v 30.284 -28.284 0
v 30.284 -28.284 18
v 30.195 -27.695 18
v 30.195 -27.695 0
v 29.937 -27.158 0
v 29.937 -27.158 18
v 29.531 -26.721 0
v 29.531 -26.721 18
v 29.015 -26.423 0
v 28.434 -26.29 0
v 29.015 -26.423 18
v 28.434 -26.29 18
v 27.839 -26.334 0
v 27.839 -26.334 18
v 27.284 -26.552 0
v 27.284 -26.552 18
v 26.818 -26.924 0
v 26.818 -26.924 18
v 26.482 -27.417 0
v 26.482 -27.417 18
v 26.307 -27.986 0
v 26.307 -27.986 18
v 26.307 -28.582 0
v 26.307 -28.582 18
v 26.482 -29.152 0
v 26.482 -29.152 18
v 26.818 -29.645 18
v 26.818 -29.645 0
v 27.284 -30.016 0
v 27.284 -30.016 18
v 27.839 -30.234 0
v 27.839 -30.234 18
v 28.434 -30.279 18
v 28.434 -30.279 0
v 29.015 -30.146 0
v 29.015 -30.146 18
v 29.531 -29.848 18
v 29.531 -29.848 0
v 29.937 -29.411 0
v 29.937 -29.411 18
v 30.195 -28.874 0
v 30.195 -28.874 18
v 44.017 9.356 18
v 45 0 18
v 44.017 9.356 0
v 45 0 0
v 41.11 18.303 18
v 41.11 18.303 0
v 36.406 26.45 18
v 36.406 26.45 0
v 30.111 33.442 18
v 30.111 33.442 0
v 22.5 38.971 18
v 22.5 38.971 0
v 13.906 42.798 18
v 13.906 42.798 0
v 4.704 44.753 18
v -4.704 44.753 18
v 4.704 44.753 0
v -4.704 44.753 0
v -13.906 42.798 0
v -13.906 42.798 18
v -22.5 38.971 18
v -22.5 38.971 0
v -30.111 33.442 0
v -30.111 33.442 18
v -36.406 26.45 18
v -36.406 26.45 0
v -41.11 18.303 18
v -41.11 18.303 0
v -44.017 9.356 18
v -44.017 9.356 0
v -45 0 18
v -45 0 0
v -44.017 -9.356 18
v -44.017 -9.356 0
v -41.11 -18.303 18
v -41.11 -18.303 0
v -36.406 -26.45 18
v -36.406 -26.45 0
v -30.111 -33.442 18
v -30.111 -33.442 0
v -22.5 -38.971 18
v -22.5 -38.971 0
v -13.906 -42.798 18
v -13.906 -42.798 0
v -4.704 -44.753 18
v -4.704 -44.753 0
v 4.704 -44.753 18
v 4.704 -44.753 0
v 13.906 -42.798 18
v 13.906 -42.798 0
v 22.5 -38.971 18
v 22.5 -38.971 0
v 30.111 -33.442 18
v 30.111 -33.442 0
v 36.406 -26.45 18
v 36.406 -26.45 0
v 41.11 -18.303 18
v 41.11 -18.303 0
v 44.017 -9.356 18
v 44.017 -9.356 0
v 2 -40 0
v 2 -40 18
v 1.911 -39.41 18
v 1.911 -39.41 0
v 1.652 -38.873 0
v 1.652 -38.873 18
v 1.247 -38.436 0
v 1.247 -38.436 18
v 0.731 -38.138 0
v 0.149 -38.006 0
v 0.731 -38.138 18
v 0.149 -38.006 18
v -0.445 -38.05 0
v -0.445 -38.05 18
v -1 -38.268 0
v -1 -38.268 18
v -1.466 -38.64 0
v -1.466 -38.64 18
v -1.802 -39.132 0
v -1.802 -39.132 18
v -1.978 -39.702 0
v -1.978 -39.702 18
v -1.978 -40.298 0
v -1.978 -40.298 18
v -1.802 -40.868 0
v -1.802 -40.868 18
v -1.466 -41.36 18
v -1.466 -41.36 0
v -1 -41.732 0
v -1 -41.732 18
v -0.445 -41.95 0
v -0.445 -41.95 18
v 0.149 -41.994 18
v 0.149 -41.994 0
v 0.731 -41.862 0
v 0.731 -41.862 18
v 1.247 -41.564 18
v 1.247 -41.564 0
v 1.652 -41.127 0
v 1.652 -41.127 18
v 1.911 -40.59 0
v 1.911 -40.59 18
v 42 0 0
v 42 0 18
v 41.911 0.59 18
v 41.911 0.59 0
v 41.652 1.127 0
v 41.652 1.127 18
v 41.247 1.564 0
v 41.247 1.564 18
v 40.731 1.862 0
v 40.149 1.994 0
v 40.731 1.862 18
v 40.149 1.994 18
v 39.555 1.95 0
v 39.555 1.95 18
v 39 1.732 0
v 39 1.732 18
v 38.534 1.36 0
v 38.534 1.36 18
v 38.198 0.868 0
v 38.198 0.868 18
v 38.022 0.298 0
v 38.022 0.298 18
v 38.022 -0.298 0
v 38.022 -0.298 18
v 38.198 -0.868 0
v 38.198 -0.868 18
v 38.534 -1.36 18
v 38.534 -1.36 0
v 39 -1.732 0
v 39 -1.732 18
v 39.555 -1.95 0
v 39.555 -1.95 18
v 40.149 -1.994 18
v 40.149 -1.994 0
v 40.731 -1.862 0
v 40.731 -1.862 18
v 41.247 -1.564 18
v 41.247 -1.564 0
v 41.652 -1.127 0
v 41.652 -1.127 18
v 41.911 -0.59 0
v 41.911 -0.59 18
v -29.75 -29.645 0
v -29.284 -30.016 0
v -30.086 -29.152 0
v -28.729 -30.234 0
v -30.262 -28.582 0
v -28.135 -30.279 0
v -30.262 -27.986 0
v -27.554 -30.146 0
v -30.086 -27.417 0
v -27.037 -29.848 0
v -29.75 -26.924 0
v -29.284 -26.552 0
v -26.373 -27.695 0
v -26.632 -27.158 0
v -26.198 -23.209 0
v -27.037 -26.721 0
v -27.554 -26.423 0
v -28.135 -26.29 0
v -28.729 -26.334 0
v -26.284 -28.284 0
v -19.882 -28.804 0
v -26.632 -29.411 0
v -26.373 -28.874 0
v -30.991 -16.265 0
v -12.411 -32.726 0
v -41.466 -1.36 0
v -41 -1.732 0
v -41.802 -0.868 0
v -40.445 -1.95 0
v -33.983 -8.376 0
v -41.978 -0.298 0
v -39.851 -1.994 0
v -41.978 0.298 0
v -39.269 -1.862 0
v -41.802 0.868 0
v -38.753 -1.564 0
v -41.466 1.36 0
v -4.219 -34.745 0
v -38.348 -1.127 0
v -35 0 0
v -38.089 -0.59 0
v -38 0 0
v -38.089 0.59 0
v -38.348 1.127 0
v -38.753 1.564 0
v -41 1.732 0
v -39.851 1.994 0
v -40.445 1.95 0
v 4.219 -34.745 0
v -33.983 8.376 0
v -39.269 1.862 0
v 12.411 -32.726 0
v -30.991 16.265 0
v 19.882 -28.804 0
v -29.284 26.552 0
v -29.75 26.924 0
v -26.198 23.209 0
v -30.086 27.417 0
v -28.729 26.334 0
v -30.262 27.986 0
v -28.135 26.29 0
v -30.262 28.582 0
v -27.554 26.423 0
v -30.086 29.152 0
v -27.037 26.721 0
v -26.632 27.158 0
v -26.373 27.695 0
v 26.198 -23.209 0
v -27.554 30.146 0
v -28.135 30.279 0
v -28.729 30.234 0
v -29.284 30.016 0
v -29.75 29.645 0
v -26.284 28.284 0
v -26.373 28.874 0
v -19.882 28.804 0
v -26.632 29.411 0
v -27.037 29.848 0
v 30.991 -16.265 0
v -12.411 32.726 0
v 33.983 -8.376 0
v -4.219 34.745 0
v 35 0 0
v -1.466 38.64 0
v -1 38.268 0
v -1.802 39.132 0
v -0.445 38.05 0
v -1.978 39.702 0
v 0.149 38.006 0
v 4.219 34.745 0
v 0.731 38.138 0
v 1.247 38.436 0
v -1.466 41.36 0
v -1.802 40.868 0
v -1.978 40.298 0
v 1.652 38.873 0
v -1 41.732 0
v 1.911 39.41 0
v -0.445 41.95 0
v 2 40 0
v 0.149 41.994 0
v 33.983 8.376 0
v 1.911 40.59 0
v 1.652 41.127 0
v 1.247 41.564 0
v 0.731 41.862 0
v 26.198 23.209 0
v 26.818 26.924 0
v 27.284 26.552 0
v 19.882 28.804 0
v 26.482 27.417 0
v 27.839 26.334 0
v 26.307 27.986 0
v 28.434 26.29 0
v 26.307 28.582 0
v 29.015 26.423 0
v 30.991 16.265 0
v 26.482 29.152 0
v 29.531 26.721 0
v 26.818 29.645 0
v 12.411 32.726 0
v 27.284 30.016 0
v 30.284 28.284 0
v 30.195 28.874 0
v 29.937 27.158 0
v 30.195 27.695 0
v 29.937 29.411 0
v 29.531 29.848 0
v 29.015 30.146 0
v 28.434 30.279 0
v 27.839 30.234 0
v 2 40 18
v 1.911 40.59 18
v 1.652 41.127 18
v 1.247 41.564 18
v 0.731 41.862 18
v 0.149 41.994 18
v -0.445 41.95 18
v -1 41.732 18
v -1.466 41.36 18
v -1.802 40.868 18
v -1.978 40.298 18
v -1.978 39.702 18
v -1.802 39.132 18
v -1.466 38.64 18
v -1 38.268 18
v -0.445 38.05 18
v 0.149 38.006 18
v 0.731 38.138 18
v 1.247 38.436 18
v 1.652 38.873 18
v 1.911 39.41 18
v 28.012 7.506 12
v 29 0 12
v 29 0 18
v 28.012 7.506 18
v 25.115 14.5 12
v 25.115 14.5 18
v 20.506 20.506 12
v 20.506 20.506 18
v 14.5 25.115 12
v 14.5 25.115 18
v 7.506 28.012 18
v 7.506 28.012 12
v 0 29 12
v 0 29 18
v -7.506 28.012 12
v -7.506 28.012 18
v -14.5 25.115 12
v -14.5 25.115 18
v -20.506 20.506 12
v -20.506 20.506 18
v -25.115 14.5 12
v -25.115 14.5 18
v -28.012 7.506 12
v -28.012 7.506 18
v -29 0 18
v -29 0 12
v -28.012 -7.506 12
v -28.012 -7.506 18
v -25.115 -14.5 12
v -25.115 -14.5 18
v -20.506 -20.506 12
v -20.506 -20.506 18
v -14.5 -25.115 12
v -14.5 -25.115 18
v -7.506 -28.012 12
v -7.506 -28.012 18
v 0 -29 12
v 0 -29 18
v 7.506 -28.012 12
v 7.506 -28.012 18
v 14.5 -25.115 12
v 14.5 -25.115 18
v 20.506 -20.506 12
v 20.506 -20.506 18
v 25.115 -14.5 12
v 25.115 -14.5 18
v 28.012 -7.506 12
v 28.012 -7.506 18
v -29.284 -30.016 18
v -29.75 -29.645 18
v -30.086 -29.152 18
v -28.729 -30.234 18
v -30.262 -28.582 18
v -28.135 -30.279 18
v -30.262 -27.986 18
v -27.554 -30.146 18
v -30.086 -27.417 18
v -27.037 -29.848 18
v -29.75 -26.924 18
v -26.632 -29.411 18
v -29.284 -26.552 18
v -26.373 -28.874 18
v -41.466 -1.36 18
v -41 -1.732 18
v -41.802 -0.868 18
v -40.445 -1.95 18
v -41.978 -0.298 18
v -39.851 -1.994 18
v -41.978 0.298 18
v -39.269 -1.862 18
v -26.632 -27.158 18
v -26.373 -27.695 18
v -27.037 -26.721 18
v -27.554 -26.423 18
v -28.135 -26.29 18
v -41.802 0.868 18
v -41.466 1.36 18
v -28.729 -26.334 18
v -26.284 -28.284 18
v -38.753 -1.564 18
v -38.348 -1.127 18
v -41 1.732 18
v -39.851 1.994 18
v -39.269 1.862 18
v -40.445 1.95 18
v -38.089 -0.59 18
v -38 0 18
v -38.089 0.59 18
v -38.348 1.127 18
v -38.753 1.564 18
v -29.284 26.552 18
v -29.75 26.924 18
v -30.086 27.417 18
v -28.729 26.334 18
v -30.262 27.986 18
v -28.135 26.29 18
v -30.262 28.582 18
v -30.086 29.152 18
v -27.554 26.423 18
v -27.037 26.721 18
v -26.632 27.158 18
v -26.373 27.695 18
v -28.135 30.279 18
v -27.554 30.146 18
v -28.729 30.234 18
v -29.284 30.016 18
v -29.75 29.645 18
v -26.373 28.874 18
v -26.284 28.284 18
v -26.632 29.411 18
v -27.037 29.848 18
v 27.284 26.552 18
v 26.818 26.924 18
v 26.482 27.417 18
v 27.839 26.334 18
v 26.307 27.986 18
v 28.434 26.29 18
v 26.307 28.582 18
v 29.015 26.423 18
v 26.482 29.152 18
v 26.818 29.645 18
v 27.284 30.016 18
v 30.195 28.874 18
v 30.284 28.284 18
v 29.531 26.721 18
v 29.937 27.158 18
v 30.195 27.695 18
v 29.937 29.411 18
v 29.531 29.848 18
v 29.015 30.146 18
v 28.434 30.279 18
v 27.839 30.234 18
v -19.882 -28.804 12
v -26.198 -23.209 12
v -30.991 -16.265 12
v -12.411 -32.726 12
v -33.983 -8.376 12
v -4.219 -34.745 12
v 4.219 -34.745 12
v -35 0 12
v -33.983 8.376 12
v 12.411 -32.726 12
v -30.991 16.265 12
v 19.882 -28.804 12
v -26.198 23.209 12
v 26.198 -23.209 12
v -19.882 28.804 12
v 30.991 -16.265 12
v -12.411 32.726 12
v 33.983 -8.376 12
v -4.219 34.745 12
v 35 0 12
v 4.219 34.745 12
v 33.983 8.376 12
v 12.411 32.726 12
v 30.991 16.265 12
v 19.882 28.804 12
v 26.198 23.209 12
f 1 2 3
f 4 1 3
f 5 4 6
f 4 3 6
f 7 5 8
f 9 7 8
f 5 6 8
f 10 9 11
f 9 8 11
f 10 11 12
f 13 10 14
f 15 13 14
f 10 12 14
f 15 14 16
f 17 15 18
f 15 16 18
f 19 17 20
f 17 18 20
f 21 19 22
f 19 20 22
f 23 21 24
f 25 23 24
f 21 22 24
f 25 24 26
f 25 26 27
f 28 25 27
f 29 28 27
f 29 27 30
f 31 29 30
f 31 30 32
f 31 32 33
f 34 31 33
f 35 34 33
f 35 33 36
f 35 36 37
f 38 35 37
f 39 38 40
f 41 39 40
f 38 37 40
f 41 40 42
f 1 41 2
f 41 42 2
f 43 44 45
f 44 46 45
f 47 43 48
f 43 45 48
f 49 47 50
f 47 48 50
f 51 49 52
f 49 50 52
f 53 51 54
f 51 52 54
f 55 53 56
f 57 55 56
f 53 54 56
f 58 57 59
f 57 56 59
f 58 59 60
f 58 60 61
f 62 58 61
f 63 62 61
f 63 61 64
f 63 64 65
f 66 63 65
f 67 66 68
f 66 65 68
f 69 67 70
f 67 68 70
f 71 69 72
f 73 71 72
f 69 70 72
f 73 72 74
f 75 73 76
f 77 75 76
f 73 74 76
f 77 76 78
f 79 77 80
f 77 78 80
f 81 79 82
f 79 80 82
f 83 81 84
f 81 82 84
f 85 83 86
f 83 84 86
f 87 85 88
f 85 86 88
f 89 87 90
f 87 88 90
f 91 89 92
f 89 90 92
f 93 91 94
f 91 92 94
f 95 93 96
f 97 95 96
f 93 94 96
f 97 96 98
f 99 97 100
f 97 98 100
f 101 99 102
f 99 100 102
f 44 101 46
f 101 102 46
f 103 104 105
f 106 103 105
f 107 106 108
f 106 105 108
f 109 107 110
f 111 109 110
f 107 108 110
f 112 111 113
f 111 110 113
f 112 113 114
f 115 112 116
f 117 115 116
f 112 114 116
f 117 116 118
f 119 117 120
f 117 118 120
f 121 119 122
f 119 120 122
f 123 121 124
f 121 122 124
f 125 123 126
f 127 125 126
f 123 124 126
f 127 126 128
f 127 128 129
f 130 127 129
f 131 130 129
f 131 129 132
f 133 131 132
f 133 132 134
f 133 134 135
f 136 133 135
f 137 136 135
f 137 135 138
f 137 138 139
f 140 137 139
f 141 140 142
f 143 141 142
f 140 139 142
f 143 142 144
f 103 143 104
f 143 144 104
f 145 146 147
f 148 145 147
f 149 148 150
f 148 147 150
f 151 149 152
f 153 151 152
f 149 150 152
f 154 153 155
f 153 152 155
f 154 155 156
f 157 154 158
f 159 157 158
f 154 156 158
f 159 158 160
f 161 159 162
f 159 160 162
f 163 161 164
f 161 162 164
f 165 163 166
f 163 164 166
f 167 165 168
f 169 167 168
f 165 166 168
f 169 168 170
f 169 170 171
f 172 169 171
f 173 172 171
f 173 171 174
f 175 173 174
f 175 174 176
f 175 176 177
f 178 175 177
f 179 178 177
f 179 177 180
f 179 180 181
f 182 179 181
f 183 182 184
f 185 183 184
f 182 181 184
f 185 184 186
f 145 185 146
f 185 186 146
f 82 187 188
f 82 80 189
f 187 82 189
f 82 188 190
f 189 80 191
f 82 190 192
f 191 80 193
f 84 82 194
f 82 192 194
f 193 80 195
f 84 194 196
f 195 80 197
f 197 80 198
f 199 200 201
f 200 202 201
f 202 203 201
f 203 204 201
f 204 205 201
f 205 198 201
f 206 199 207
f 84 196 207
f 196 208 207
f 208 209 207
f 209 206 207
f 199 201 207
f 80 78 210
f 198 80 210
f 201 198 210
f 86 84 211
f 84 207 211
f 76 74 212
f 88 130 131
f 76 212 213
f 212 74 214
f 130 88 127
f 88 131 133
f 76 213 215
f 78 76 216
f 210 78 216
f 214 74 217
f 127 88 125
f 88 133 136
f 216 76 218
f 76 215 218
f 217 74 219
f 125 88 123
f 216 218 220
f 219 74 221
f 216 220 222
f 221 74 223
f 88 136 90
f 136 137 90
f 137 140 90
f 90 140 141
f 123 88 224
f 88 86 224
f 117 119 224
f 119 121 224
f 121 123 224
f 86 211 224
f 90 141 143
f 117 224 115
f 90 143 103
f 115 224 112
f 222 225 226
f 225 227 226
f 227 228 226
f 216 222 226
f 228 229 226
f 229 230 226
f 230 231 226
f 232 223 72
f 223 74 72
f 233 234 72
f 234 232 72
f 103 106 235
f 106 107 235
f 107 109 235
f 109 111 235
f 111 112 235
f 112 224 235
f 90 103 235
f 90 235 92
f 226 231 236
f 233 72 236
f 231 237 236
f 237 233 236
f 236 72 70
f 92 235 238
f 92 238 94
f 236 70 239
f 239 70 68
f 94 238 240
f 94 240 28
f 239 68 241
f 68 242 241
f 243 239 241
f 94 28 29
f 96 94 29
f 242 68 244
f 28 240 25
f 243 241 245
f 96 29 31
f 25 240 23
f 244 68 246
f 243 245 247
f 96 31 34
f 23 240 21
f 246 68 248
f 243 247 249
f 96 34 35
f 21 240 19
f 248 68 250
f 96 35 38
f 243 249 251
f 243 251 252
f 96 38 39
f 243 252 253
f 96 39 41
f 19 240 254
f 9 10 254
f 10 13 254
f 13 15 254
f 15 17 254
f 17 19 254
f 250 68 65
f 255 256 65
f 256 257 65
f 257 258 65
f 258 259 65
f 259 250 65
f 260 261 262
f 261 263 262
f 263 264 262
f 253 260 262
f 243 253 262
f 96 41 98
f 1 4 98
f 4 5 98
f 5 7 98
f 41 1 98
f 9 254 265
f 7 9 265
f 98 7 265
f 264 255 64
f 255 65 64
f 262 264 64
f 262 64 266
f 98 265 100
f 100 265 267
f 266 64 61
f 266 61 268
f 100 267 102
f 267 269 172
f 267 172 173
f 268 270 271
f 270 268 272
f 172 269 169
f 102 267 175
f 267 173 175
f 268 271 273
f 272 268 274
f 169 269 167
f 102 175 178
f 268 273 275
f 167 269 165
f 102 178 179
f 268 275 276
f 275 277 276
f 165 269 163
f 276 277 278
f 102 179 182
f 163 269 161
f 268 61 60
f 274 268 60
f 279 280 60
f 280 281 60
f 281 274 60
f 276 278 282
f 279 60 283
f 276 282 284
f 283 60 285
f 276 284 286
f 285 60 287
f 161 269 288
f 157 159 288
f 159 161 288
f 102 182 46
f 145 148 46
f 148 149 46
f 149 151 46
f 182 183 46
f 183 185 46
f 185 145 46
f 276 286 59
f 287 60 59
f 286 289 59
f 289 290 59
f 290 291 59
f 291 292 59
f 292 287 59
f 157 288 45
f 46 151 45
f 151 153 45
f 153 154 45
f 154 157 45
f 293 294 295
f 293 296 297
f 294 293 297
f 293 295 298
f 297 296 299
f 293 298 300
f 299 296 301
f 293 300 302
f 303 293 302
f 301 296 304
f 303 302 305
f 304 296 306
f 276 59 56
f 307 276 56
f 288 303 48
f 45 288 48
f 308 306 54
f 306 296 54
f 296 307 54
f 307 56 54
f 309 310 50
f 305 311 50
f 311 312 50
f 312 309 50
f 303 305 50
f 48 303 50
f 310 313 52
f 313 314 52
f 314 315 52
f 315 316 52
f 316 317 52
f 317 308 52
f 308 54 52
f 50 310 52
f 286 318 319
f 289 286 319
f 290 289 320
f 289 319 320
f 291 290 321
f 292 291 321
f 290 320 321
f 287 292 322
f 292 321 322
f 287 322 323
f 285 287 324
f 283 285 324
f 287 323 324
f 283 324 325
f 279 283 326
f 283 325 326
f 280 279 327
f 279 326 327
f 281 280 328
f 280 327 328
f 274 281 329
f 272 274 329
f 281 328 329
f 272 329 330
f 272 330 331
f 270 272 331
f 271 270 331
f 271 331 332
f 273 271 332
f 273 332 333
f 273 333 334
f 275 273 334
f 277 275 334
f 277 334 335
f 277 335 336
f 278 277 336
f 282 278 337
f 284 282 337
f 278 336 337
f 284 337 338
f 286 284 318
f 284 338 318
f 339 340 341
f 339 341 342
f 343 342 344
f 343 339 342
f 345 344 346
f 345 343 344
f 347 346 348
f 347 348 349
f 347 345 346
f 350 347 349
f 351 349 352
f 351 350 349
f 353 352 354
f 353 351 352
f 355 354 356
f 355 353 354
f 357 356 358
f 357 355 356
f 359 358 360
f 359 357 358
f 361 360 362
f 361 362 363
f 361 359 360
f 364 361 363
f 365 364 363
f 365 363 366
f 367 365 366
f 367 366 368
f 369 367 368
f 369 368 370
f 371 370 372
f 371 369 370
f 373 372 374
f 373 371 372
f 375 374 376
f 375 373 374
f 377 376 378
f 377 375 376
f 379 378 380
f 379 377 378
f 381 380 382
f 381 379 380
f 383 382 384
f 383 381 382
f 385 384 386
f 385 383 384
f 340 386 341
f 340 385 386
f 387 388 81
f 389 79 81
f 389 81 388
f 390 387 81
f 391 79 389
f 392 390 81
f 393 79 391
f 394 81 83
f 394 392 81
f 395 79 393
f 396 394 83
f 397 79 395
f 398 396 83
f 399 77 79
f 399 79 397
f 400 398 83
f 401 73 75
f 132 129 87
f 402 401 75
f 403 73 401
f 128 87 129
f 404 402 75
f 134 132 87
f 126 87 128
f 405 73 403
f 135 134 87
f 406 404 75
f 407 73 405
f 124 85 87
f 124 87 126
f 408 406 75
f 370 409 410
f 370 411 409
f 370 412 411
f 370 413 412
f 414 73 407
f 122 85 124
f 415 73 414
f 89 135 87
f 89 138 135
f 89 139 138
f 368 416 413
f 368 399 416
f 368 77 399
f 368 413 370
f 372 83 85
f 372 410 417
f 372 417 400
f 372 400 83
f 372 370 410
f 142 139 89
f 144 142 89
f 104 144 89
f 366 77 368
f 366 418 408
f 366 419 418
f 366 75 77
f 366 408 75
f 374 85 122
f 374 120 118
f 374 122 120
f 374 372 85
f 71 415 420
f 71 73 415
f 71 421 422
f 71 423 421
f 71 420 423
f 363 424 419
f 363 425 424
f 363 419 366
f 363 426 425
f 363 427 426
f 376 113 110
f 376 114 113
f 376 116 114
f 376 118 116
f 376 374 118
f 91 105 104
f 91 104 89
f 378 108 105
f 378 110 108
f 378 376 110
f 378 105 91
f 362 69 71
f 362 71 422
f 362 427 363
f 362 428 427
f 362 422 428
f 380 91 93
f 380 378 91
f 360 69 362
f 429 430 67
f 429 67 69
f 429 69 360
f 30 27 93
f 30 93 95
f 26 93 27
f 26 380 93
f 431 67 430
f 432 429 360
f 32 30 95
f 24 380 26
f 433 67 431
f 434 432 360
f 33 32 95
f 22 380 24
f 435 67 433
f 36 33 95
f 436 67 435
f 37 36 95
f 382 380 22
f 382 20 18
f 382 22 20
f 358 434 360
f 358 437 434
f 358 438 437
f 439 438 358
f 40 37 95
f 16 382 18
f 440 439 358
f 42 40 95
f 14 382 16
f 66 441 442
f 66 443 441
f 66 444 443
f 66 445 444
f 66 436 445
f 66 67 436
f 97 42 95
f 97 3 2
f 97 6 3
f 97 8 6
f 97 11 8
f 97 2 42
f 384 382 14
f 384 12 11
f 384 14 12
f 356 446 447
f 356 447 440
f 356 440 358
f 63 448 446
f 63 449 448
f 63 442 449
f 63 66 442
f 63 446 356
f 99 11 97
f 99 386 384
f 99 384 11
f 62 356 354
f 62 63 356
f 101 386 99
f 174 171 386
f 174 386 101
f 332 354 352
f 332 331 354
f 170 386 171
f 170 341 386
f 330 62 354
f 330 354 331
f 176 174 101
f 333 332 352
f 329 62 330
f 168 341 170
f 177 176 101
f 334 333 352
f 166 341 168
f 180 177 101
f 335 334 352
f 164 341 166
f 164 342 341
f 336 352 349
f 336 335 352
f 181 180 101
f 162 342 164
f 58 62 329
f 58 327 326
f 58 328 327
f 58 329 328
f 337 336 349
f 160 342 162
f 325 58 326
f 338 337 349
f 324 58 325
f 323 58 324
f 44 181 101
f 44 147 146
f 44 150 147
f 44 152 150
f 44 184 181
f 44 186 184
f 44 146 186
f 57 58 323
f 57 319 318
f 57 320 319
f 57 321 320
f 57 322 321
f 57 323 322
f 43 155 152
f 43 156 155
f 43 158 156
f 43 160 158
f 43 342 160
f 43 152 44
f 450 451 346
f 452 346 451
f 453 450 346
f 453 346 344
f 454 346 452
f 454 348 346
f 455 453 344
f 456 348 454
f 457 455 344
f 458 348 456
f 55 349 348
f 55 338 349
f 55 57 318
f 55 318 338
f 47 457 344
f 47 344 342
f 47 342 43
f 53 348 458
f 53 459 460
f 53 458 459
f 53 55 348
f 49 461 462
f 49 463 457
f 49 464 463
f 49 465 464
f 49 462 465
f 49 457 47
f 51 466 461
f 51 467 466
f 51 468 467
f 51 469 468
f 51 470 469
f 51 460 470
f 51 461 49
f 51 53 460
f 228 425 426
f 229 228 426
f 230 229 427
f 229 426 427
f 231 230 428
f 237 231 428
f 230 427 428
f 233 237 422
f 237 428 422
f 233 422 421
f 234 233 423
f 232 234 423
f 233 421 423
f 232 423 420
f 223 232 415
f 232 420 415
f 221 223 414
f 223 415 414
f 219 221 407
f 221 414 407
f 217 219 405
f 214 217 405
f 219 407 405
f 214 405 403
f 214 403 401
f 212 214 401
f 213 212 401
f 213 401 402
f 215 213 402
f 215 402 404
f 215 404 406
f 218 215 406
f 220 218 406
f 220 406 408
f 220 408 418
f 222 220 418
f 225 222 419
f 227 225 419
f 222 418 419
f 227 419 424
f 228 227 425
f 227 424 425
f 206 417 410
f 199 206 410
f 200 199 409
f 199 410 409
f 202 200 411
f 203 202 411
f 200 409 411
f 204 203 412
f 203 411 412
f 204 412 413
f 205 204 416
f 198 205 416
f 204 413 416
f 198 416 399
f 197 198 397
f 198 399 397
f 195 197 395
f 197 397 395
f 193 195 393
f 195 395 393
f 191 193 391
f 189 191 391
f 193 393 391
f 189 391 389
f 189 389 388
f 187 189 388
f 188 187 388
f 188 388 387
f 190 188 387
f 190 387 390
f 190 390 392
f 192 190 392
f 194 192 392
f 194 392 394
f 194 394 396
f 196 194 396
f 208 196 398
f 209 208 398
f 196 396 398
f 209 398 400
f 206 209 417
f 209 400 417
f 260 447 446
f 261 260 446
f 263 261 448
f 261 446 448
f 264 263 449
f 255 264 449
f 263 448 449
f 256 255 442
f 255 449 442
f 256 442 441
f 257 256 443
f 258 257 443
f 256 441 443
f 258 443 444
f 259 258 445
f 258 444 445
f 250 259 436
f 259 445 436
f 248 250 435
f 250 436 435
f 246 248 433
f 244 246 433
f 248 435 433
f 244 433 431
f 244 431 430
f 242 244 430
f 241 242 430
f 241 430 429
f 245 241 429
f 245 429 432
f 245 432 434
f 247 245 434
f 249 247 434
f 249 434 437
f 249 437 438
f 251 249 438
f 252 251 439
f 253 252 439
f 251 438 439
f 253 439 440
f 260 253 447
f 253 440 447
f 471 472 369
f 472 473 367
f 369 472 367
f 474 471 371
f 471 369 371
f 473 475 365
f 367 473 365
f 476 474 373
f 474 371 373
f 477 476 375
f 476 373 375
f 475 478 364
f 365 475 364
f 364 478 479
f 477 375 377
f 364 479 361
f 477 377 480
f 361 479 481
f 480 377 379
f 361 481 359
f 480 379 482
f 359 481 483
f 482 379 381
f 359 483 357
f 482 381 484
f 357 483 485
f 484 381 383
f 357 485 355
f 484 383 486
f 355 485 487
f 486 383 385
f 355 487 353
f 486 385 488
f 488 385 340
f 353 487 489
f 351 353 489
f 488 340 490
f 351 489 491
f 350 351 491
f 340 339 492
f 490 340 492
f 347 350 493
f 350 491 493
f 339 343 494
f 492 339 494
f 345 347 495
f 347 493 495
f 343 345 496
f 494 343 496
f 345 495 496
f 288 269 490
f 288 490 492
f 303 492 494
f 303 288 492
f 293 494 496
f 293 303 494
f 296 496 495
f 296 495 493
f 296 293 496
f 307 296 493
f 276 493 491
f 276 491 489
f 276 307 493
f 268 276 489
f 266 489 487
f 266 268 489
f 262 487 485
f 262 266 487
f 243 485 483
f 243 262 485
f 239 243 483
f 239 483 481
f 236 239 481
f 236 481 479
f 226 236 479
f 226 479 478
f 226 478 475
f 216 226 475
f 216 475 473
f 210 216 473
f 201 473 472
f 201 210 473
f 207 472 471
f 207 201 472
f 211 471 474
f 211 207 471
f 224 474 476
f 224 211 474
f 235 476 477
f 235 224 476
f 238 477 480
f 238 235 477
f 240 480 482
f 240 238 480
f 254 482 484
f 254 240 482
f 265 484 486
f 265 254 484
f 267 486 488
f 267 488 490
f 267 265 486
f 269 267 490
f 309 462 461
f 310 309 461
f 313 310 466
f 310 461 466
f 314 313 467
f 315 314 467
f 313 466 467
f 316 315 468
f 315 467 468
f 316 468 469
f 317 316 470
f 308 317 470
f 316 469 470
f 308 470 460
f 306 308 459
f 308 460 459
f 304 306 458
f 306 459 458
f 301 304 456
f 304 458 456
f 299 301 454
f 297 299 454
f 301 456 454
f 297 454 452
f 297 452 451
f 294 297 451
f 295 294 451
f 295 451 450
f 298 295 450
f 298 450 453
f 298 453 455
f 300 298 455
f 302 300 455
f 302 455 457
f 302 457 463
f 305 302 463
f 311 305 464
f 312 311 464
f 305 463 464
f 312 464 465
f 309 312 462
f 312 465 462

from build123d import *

# Parameters (mm, degrees)
SKETCH_1_R          = 45
SKETCH_1_R_2        = 35
EXTRUDE_1_DEPTH     = 12
SKETCH_2_R          = 45
SKETCH_2_R_2        = 29
EXTRUDE_2_DEPTH     = 6
SKETCH_4_R          = 2
CUT_EXTRUDE_1_DEPTH = 18


with BuildPart() as part:
    # 草图1 → 凸台-拉伸1 (new body)
    with BuildSketch(Plane.XY):
        Circle(SKETCH_1_R)
        Circle(SKETCH_1_R_2, mode=Mode.SUBTRACT)
    extrude(amount=EXTRUDE_1_DEPTH)

    # 草图2 → 凸台-拉伸2 (add)
    with BuildSketch(Plane.XY.offset(12)):
        Circle(SKETCH_2_R)
        Circle(SKETCH_2_R_2, mode=Mode.SUBTRACT)
    extrude(amount=EXTRUDE_2_DEPTH)

    # 草图4 → 切除-拉伸1 (cut)
    with BuildSketch(Plane.XY.offset(18)):
        with Locations((0, 40)):
            Circle(SKETCH_4_R)
        with Locations((28.284271247, 28.284271247)):
            Circle(SKETCH_4_R)
        with Locations((40, 0)):
            Circle(SKETCH_4_R)
        with Locations((28.284271247, -28.284271247)):
            Circle(SKETCH_4_R)
        with Locations((0, -40)):
            Circle(SKETCH_4_R)
        with Locations((-28.284271247, -28.284271247)):
            Circle(SKETCH_4_R)
        with Locations((-40, 0)):
            Circle(SKETCH_4_R)
        with Locations((-28.284271247, 28.284271247)):
            Circle(SKETCH_4_R)
    extrude(amount=-CUT_EXTRUDE_1_DEPTH, mode=Mode.SUBTRACT)


solid = part.part
